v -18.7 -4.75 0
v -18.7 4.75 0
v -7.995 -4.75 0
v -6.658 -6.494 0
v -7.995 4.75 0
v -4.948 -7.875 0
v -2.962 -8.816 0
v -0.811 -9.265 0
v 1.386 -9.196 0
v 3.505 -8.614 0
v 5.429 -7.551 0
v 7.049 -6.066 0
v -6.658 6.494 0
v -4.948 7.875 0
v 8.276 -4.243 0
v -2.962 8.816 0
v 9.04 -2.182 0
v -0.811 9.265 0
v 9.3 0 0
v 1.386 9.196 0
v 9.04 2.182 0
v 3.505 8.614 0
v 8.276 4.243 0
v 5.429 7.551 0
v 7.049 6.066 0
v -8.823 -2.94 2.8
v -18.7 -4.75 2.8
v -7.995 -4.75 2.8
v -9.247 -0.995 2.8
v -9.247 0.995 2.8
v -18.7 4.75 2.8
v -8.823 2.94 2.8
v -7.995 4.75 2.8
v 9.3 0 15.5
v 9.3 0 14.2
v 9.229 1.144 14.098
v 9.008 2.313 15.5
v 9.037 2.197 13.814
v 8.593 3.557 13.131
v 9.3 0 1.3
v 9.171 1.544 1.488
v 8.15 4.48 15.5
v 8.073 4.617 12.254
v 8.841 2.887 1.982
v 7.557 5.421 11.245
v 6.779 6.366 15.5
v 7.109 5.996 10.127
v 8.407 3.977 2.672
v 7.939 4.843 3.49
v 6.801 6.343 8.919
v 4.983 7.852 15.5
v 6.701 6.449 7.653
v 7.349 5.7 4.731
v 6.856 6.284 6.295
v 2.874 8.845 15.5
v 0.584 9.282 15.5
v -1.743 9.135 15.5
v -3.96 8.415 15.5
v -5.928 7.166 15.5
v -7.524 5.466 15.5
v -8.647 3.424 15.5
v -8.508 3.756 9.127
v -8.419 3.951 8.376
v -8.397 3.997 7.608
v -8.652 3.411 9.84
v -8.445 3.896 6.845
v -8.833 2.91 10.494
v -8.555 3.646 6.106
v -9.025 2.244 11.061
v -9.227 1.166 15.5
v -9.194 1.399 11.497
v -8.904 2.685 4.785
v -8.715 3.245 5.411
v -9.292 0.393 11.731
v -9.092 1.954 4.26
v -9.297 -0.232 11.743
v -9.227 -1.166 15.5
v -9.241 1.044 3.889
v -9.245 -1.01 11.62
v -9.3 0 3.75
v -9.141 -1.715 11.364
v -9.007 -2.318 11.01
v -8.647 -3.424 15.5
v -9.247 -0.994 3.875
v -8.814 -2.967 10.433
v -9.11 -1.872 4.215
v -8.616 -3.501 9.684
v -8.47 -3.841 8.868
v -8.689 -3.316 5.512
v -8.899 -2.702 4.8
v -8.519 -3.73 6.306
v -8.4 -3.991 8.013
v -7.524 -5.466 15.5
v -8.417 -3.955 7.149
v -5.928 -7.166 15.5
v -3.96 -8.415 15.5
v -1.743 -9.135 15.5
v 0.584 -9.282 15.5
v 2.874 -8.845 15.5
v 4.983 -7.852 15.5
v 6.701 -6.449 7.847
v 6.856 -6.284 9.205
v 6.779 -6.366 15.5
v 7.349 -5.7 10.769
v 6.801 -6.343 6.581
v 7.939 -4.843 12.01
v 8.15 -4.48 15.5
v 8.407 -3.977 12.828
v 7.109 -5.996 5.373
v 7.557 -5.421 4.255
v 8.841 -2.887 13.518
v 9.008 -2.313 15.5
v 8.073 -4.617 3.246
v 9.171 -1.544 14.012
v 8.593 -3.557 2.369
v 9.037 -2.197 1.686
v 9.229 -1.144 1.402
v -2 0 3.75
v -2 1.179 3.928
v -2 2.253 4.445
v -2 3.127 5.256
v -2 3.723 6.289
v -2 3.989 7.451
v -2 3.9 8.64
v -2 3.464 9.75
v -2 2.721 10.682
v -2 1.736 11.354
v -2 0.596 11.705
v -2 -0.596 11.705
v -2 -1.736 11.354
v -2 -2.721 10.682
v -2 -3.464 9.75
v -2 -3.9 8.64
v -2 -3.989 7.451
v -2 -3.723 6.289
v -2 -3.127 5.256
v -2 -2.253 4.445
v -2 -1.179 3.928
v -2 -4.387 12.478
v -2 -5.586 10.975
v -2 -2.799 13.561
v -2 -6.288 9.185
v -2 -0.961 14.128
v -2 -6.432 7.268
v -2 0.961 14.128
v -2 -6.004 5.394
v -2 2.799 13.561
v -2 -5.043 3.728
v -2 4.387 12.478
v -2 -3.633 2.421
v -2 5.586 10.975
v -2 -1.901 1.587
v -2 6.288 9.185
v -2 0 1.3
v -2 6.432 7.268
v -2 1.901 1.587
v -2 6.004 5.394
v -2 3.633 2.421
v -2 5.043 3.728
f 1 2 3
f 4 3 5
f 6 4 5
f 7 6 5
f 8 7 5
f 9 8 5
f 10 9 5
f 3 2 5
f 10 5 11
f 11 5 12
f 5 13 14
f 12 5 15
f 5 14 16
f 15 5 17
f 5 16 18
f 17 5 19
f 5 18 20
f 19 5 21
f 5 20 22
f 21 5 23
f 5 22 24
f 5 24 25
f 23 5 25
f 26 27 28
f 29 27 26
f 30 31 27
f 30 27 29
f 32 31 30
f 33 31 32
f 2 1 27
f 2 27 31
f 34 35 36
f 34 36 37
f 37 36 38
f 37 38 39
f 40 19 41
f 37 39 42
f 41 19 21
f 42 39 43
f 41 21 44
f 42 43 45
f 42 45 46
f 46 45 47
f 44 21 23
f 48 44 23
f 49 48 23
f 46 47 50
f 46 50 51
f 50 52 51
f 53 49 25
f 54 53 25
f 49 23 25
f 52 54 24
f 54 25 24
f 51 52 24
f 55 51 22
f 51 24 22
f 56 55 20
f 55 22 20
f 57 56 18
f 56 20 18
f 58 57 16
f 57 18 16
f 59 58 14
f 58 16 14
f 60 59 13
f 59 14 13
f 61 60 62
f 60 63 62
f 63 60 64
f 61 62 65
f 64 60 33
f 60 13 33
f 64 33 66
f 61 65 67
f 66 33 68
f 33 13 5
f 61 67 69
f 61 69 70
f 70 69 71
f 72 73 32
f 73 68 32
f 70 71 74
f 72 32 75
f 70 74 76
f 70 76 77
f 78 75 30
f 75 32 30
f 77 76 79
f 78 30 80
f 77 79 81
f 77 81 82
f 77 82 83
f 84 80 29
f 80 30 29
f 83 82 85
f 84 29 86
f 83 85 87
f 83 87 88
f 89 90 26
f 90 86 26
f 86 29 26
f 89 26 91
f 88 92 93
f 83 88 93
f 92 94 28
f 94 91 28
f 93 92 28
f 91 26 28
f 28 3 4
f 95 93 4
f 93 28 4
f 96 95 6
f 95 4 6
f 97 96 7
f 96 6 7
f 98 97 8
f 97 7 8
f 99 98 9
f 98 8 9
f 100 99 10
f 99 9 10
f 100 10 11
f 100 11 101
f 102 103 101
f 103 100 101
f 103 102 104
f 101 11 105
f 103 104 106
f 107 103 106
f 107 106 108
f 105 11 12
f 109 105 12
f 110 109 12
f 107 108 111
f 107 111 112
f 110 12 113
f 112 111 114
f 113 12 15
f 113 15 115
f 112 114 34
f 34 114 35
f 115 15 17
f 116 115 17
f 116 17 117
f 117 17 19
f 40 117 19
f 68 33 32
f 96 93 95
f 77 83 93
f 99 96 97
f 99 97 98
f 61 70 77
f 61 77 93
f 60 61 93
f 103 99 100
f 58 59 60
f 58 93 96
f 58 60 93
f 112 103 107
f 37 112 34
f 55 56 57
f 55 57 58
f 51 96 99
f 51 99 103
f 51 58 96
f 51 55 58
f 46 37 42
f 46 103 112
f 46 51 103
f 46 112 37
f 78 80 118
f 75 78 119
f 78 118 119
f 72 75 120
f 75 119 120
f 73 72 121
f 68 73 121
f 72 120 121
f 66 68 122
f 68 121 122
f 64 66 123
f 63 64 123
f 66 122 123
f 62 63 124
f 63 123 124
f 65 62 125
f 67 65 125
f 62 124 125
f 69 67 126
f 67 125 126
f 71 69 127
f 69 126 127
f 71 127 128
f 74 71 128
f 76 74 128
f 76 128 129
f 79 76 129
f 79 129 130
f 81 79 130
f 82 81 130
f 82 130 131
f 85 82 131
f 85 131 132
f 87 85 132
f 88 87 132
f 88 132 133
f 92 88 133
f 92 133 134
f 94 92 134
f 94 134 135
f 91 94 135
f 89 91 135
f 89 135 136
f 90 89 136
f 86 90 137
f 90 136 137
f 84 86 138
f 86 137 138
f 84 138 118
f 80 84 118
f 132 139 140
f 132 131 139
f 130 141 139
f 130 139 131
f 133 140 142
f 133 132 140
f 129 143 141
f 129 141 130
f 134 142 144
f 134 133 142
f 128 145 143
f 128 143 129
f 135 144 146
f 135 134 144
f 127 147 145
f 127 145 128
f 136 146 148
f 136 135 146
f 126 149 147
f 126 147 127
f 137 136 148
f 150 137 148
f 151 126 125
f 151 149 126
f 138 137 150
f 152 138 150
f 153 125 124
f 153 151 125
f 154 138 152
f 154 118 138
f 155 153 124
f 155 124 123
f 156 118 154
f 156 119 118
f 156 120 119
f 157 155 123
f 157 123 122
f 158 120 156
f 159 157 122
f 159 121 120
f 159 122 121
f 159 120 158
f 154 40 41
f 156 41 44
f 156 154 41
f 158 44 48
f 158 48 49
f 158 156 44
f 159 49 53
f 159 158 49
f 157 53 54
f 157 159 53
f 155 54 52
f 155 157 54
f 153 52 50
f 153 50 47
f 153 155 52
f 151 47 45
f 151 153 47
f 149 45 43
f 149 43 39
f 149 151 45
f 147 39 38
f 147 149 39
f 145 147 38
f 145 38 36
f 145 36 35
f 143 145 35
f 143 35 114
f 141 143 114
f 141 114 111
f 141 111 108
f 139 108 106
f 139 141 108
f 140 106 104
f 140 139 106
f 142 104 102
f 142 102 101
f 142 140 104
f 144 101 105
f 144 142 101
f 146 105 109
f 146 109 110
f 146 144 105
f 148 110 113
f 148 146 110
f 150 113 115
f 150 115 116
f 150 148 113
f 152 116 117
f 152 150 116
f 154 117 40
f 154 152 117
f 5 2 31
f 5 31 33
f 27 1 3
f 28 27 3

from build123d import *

# Parameters (mm, degrees)
SKETCH_1_R               = 9.3
EXTRUDE_1_DEPTH          = 15.5
SKETCH_2_W               = 10.704532534
SKETCH_2_H               = 9.5
EXTRUDE_2_DEPTH          = 2.8
SKETCH_3_R               = 6.45
CUT_EXTRUDE_1_DEPTH      = 10.3
CUT_EXTRUDE_1_DEPTH_BACK = 2
SKETCH_4_R               = 4
CUT_EXTRUDE_2_DEPTH      = 17.7


with BuildPart() as part:
    # Эскиз1 → Бобышка-Вытянуть1 (new body)
    with BuildSketch(Plane.XY):
        Circle(SKETCH_1_R)
    extrude(amount=EXTRUDE_1_DEPTH)

    # Эскиз2 → Бобышка-Вытянуть2 (add)
    with BuildSketch(Plane.XY):
        with Locations((-13.347733733, 0)):
            Rectangle(SKETCH_2_W, SKETCH_2_H)
    extrude(amount=EXTRUDE_2_DEPTH)

    # Эскиз3 → Вырез-Вытянуть1 (cut, two sides)
    with BuildSketch(Plane(origin=(0, 0, 0), x_dir=(0, 0, -1), z_dir=(1, 0, 0))) as cut_extrude_1_sk:
        with Locations((-7.75, 0)):
            Circle(SKETCH_3_R)
    extrude(amount=CUT_EXTRUDE_1_DEPTH, mode=Mode.SUBTRACT)
    extrude(cut_extrude_1_sk.sketch, amount=-CUT_EXTRUDE_1_DEPTH_BACK, mode=Mode.SUBTRACT)

    # Эскиз4 → Вырез-Вытянуть2 (cut, through all)
    with BuildSketch(Plane(origin=(-2, 0, 0), x_dir=(0, 0, -1), z_dir=(1, 0, 0))):
        with Locations((-7.75, 0)):
            Circle(SKETCH_4_R)
    extrude(amount=-CUT_EXTRUDE_2_DEPTH, mode=Mode.SUBTRACT)


solid = part.part
